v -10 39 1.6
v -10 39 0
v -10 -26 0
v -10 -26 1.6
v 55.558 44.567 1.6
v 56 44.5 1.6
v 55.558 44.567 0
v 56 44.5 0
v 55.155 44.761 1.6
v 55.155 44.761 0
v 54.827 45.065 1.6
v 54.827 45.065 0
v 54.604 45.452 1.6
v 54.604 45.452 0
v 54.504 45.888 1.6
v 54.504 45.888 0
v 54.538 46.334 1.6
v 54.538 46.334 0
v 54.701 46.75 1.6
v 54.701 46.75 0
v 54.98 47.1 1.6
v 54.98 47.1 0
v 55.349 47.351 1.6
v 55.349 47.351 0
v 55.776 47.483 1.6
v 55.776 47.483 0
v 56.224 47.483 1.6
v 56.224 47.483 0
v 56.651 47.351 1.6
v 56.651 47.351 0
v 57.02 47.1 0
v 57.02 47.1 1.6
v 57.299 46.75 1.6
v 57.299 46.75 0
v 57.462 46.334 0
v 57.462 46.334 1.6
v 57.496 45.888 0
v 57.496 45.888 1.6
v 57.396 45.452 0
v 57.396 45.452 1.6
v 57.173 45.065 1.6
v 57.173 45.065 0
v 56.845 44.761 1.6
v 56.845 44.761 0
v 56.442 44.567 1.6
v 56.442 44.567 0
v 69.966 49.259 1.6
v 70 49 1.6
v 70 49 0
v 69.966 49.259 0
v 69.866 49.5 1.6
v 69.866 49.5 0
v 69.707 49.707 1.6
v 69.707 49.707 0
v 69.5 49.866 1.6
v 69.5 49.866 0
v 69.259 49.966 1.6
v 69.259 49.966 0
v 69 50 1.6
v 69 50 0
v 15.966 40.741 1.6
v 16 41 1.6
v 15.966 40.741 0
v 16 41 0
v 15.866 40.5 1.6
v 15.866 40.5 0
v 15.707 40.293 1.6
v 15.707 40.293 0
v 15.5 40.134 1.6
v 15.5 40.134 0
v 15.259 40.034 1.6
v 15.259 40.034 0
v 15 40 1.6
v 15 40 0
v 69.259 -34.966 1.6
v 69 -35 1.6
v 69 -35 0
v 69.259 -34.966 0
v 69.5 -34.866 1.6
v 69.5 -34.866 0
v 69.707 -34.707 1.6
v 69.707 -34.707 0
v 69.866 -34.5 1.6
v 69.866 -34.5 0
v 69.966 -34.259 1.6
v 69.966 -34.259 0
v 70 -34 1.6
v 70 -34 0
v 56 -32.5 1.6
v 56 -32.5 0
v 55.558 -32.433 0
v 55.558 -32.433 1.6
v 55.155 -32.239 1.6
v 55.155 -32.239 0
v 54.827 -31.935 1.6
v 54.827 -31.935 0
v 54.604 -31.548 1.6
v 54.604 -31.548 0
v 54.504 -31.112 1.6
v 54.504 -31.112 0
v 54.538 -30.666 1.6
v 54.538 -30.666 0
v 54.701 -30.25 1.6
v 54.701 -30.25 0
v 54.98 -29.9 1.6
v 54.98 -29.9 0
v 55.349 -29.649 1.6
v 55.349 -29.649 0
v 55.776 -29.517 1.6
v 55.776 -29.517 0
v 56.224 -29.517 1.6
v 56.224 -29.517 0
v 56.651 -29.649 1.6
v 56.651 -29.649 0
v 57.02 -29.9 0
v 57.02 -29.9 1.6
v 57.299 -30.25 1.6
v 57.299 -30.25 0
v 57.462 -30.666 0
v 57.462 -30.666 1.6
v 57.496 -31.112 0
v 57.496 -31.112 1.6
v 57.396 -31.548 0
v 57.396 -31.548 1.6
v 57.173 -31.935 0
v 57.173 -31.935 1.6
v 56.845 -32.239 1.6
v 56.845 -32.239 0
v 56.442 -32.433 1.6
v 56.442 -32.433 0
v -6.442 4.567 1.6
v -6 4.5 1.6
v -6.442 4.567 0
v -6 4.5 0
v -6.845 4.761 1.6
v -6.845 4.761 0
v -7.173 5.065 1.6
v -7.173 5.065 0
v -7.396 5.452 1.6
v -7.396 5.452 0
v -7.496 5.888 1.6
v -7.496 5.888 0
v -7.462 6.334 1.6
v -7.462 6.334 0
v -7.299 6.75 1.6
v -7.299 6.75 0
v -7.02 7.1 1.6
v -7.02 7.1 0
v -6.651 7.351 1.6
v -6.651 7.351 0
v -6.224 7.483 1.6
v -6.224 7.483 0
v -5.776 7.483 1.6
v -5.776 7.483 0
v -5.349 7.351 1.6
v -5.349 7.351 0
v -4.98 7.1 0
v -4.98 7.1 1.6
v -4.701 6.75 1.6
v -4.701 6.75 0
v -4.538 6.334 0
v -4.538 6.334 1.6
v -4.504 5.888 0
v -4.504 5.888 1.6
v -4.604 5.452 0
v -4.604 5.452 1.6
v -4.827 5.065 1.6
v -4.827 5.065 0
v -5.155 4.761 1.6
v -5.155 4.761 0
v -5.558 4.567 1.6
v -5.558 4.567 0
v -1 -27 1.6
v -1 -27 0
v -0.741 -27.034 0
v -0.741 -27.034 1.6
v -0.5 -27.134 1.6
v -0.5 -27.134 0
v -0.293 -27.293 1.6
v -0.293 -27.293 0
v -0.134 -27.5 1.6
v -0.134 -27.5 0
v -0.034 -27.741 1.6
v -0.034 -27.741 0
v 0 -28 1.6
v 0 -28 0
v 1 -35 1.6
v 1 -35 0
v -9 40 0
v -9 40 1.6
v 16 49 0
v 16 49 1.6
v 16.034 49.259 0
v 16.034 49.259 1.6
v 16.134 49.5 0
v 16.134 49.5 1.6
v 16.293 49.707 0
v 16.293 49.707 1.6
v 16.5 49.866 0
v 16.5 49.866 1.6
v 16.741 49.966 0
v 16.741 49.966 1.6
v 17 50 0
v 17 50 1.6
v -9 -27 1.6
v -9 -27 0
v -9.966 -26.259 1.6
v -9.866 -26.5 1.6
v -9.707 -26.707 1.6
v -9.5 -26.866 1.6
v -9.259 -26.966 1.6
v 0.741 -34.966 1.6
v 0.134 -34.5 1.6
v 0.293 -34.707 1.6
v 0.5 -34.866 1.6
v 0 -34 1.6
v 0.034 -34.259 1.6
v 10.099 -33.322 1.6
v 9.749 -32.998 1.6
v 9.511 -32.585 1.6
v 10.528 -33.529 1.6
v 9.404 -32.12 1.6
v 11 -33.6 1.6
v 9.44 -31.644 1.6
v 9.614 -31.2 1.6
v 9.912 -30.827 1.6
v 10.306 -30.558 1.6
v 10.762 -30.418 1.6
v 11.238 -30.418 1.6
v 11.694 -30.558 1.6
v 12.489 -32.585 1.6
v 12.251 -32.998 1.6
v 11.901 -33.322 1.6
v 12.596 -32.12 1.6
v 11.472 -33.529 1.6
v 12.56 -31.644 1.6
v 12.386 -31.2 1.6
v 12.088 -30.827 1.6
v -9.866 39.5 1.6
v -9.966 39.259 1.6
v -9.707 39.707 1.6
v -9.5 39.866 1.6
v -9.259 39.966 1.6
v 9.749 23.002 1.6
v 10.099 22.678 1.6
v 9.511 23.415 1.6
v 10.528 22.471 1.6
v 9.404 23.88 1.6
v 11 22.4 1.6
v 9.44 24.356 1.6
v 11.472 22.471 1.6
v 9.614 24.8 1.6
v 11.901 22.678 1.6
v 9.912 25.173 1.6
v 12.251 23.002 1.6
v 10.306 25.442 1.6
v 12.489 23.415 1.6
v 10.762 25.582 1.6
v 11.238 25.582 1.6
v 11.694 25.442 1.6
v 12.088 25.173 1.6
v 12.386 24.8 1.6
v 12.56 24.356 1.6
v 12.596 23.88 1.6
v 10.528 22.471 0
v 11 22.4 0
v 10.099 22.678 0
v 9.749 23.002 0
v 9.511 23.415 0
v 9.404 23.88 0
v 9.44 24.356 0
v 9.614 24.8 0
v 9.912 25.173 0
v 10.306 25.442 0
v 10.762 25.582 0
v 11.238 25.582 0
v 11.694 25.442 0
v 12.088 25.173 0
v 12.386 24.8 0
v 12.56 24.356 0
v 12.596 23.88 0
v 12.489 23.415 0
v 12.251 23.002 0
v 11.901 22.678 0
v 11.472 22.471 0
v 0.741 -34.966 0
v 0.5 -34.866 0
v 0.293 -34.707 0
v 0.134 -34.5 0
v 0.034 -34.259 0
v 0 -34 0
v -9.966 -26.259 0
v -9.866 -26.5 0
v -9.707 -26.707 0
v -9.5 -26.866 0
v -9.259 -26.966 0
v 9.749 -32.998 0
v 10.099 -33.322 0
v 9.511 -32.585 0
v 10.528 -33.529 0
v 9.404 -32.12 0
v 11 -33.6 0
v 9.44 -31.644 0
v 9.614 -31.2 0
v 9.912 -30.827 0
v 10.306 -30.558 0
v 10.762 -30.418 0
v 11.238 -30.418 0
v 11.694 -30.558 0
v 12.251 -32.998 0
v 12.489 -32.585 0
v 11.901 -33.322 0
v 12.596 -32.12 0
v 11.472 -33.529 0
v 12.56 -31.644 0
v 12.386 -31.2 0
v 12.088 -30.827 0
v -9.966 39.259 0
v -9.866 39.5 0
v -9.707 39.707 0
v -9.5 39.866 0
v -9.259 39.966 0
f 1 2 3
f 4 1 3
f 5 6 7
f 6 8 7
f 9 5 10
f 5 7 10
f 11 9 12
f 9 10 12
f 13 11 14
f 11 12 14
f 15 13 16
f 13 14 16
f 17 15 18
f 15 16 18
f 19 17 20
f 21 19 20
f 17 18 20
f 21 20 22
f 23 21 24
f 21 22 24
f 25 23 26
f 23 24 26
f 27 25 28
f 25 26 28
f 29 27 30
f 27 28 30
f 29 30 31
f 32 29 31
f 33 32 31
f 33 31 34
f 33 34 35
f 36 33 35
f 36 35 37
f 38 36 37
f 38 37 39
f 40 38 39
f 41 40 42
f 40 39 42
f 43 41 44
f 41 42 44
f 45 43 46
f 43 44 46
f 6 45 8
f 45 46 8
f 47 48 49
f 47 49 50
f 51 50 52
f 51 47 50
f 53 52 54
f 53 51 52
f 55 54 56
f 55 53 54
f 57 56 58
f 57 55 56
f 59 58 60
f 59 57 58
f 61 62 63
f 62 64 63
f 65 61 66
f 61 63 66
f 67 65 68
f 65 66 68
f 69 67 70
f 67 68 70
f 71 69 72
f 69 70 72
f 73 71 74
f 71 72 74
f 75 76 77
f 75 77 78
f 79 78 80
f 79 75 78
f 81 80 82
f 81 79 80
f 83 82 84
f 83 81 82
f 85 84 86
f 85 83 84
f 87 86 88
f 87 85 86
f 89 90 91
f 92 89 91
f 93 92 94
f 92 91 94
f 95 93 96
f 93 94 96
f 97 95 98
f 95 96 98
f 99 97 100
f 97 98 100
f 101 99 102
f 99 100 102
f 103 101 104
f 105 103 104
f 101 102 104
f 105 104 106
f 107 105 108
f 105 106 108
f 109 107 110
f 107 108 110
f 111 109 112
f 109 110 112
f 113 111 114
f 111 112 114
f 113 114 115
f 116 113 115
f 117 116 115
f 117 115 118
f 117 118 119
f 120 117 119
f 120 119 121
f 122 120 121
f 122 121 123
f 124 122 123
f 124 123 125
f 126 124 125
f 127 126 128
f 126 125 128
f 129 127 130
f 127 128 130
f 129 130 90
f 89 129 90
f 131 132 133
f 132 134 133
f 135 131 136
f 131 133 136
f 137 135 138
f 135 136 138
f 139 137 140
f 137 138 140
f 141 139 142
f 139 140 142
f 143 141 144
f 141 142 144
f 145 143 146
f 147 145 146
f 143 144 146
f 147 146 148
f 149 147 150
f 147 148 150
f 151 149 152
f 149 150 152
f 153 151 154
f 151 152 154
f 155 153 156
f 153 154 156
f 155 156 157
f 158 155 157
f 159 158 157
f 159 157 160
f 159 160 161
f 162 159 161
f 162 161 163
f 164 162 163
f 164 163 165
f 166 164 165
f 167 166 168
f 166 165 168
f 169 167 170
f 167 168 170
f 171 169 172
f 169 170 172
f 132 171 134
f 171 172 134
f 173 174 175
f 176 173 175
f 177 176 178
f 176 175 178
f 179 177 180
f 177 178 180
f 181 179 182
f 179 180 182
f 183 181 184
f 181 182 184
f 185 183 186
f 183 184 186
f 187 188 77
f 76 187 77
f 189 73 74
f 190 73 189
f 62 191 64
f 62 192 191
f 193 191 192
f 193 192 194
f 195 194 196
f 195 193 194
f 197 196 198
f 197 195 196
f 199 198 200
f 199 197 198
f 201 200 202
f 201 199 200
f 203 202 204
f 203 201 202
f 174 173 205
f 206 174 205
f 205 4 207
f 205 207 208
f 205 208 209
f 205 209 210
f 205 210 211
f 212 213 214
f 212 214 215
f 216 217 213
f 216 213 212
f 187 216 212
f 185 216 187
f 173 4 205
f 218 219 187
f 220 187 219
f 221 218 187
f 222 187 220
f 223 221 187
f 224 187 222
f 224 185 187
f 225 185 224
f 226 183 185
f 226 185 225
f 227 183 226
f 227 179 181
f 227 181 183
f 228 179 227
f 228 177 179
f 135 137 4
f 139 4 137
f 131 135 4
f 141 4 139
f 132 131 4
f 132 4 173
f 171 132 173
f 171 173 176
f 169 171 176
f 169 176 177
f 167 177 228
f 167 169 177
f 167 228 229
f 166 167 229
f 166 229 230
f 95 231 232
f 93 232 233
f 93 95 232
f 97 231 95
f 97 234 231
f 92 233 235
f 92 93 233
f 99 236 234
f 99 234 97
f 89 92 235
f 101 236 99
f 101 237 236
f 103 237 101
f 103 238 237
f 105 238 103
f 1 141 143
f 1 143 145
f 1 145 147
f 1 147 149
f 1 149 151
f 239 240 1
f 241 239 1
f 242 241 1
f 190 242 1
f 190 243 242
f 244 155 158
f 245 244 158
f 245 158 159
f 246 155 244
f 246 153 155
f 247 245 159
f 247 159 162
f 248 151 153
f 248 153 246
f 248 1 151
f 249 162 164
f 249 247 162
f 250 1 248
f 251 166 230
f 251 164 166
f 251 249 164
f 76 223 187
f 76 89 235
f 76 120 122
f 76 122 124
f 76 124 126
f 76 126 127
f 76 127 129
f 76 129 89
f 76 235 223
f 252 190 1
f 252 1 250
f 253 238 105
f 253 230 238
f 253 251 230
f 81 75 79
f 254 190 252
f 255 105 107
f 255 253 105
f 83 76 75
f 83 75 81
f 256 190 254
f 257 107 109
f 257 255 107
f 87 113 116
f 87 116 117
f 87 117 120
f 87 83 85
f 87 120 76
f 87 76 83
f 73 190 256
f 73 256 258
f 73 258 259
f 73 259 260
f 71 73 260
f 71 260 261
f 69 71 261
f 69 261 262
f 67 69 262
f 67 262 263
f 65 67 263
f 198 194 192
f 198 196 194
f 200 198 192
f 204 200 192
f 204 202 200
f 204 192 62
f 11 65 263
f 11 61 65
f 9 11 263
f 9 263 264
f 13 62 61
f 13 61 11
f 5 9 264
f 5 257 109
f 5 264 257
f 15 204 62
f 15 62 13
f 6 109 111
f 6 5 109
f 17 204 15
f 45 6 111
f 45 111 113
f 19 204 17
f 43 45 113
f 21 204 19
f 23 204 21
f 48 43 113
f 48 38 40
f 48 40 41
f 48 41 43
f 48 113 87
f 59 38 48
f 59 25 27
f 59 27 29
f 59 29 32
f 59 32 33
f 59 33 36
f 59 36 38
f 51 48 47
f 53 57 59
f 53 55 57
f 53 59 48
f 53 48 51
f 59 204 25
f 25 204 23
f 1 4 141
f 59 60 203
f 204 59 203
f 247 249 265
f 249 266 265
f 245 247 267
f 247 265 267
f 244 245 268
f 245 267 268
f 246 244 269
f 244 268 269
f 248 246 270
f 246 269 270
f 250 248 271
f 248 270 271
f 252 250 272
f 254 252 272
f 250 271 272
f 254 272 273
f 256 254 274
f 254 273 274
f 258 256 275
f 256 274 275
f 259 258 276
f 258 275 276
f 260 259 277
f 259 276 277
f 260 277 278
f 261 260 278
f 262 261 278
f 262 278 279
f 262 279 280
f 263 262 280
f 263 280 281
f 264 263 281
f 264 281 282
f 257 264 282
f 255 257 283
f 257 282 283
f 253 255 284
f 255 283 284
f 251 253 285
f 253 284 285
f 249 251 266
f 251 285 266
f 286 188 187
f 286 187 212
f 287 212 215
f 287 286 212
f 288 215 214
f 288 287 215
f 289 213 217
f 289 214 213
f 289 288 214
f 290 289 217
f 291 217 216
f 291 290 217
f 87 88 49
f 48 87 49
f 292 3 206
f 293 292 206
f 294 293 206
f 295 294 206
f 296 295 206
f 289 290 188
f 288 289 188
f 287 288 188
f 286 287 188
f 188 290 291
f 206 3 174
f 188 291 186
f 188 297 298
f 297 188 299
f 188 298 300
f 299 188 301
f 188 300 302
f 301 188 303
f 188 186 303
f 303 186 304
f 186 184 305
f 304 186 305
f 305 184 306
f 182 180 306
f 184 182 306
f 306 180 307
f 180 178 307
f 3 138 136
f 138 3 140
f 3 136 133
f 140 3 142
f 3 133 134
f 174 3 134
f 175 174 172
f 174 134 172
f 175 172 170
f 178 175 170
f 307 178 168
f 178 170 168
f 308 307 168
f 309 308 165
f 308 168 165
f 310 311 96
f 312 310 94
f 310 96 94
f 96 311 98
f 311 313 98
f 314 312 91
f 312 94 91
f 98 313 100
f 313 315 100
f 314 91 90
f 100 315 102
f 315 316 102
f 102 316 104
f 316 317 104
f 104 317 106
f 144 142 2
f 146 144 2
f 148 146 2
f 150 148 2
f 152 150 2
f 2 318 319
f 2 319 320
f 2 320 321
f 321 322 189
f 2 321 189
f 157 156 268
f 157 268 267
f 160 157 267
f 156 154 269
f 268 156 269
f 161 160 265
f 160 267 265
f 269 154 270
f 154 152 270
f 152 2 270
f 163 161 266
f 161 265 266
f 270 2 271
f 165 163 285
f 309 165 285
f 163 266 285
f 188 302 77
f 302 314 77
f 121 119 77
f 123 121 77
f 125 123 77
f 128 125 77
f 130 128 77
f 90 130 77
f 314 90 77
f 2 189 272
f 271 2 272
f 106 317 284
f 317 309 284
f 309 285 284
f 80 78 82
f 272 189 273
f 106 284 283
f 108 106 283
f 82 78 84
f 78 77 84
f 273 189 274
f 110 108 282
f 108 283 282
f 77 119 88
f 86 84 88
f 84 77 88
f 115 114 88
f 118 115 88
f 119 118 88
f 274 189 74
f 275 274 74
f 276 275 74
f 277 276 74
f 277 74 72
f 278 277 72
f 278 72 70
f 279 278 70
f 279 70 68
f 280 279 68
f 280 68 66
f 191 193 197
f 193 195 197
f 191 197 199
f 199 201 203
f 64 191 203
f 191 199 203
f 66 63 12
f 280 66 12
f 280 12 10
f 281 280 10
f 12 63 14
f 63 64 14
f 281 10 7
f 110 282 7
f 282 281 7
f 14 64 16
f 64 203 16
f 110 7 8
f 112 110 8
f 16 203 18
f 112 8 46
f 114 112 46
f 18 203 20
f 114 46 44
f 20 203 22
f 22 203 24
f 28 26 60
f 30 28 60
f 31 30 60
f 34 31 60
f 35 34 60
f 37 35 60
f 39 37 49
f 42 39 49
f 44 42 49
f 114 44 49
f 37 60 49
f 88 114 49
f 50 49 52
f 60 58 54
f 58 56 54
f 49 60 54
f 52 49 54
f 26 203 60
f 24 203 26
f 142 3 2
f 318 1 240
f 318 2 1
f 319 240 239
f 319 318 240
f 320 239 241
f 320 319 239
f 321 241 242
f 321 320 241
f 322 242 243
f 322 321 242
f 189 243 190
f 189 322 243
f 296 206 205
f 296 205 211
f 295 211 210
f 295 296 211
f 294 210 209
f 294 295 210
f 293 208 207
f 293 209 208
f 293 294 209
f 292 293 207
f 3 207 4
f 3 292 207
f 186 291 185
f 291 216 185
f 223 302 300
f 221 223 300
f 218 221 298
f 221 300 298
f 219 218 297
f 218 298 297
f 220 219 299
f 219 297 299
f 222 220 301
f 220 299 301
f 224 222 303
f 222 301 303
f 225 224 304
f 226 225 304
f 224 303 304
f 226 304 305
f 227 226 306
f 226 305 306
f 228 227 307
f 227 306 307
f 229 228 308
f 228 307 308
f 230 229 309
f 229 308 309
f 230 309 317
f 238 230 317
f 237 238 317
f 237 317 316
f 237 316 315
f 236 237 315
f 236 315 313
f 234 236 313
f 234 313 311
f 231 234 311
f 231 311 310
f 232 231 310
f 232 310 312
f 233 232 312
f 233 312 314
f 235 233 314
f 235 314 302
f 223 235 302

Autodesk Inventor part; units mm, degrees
ref_plane "YZ Plane" through (0, 0, 0) normal (1, 0, 0) x (0, 1, 0)
ref_plane "XZ Plane" through (0, 0, 0) normal (0, 1, 0) x (-1, 0, 0)
ref_plane "XY Plane" through (0, 0, 0) normal (0, 0, 1) x (1, 0, 0)
sketch "Skizze1" plane through (0, 0, 0) normal (0, 0, 1) x (1, 0, 0)
  line L0 (-10, -35) -> (70, -35)
  line L1 (70, -35) -> (70, 50)
  line L2 (70, 50) -> (-10, 50)
  line L3 (-10, 50) -> (-10, -35)
  line L4 (0, 67) -> (0, -52) projected
  line L5 (-26, 0) -> (86, 0) projected
  dimension "d0" = 80
  dimension "d1" = 85
  dimension "d4" = 35
  dimension "d5" = 10
extrude "Extrusion1" add sketch "Skizze1" along normal blind 1.6
sketch "Skizze3" plane through (0, 0, 1.6) normal (0, 0, 1) x (1, 0, 0)
  line L0 (-10, -35) -> (70, -35) projected
  line L1 (70, -35) -> (70, 50) projected
  line L2 (70, 50) -> (-10, 50) projected
  line L3 (-10, 50) -> (-10, -35) projected
  line L4 (-10, -35) -> (0, -35)
  line L5 (0, -35) -> (0, -27)
  line L6 (0, -27) -> (-10, -27)
  line L7 (-10, -27) -> (-10, -35)
  line L8 (70, 50) -> (-10, 50) projected
  line L9 (-10, 50) -> (16, 50)
  line L10 (16, 50) -> (16, 40)
  line L11 (16, 40) -> (-10, 40)
  line L12 (-10, 40) -> (-10, 50)
  point P0 (0, 0)
  dimension "d19" = 10
  dimension "d20" = 8
  dimension "d23" = 26
  dimension "d24" = 10
extrude "Extrusion2" cut sketch "Skizze3" against normal through all contours L3 L6 L5 L0 | L3 L2 L10 L11
sketch "Skizze2" plane through (0, 0, 1.6) normal (0, 0, 1) x (1, 0, 0)
  line L0 (-26, 0) -> (86, 0) projected
  line L1 (0, 67) -> (0, -52) projected
  point P0 (0, 0)
  point P1 (56, 46)
  point P2 (56, -31)
  point P3 (-6, 6)
  dimension "d13" = 56
  dimension "d14" = 46
  dimension "d15" = 6
  dimension "d17" = 31
  dimension "d18" = 56
  dimension "d35" = 6
hole "Montage" at (56, 46, 1.6) at (56, -31, 1.6) at (-6, 6, 1.6) direction (0, 0, -1) diameter 3 end through all
sketch "Skizze4" plane through (0, 0, 1.6) normal (0, 0, 1) x (1, 0, 0)
  line L0 (0, 67) -> (0, -52) projected
  line L1 (-26, 0) -> (86, 0) projected
  line L2 (11, -32) -> (11, 24) construction
  point P0 (0, 0)
  dimension "d25" = 11
  dimension "d26" = 32
  dimension "d27" = 56
hole "Display" at (11, 24, 1.6) at (11, -32, 1.6) direction (0, 0, -1) diameter 3.2 end through all
fillet "Rundung1" radius 1 8 edges at (-10, -27, 0.8) (0, -27, 0.8) (0, -35, 0.8) (70, -35, 0.8) (70, 50, 0.8) (16, 50, 0.8) (16, 40, 0.8) (-10, 40, 0.8)
properties part number "Mainboard" material "Phenolharz"
